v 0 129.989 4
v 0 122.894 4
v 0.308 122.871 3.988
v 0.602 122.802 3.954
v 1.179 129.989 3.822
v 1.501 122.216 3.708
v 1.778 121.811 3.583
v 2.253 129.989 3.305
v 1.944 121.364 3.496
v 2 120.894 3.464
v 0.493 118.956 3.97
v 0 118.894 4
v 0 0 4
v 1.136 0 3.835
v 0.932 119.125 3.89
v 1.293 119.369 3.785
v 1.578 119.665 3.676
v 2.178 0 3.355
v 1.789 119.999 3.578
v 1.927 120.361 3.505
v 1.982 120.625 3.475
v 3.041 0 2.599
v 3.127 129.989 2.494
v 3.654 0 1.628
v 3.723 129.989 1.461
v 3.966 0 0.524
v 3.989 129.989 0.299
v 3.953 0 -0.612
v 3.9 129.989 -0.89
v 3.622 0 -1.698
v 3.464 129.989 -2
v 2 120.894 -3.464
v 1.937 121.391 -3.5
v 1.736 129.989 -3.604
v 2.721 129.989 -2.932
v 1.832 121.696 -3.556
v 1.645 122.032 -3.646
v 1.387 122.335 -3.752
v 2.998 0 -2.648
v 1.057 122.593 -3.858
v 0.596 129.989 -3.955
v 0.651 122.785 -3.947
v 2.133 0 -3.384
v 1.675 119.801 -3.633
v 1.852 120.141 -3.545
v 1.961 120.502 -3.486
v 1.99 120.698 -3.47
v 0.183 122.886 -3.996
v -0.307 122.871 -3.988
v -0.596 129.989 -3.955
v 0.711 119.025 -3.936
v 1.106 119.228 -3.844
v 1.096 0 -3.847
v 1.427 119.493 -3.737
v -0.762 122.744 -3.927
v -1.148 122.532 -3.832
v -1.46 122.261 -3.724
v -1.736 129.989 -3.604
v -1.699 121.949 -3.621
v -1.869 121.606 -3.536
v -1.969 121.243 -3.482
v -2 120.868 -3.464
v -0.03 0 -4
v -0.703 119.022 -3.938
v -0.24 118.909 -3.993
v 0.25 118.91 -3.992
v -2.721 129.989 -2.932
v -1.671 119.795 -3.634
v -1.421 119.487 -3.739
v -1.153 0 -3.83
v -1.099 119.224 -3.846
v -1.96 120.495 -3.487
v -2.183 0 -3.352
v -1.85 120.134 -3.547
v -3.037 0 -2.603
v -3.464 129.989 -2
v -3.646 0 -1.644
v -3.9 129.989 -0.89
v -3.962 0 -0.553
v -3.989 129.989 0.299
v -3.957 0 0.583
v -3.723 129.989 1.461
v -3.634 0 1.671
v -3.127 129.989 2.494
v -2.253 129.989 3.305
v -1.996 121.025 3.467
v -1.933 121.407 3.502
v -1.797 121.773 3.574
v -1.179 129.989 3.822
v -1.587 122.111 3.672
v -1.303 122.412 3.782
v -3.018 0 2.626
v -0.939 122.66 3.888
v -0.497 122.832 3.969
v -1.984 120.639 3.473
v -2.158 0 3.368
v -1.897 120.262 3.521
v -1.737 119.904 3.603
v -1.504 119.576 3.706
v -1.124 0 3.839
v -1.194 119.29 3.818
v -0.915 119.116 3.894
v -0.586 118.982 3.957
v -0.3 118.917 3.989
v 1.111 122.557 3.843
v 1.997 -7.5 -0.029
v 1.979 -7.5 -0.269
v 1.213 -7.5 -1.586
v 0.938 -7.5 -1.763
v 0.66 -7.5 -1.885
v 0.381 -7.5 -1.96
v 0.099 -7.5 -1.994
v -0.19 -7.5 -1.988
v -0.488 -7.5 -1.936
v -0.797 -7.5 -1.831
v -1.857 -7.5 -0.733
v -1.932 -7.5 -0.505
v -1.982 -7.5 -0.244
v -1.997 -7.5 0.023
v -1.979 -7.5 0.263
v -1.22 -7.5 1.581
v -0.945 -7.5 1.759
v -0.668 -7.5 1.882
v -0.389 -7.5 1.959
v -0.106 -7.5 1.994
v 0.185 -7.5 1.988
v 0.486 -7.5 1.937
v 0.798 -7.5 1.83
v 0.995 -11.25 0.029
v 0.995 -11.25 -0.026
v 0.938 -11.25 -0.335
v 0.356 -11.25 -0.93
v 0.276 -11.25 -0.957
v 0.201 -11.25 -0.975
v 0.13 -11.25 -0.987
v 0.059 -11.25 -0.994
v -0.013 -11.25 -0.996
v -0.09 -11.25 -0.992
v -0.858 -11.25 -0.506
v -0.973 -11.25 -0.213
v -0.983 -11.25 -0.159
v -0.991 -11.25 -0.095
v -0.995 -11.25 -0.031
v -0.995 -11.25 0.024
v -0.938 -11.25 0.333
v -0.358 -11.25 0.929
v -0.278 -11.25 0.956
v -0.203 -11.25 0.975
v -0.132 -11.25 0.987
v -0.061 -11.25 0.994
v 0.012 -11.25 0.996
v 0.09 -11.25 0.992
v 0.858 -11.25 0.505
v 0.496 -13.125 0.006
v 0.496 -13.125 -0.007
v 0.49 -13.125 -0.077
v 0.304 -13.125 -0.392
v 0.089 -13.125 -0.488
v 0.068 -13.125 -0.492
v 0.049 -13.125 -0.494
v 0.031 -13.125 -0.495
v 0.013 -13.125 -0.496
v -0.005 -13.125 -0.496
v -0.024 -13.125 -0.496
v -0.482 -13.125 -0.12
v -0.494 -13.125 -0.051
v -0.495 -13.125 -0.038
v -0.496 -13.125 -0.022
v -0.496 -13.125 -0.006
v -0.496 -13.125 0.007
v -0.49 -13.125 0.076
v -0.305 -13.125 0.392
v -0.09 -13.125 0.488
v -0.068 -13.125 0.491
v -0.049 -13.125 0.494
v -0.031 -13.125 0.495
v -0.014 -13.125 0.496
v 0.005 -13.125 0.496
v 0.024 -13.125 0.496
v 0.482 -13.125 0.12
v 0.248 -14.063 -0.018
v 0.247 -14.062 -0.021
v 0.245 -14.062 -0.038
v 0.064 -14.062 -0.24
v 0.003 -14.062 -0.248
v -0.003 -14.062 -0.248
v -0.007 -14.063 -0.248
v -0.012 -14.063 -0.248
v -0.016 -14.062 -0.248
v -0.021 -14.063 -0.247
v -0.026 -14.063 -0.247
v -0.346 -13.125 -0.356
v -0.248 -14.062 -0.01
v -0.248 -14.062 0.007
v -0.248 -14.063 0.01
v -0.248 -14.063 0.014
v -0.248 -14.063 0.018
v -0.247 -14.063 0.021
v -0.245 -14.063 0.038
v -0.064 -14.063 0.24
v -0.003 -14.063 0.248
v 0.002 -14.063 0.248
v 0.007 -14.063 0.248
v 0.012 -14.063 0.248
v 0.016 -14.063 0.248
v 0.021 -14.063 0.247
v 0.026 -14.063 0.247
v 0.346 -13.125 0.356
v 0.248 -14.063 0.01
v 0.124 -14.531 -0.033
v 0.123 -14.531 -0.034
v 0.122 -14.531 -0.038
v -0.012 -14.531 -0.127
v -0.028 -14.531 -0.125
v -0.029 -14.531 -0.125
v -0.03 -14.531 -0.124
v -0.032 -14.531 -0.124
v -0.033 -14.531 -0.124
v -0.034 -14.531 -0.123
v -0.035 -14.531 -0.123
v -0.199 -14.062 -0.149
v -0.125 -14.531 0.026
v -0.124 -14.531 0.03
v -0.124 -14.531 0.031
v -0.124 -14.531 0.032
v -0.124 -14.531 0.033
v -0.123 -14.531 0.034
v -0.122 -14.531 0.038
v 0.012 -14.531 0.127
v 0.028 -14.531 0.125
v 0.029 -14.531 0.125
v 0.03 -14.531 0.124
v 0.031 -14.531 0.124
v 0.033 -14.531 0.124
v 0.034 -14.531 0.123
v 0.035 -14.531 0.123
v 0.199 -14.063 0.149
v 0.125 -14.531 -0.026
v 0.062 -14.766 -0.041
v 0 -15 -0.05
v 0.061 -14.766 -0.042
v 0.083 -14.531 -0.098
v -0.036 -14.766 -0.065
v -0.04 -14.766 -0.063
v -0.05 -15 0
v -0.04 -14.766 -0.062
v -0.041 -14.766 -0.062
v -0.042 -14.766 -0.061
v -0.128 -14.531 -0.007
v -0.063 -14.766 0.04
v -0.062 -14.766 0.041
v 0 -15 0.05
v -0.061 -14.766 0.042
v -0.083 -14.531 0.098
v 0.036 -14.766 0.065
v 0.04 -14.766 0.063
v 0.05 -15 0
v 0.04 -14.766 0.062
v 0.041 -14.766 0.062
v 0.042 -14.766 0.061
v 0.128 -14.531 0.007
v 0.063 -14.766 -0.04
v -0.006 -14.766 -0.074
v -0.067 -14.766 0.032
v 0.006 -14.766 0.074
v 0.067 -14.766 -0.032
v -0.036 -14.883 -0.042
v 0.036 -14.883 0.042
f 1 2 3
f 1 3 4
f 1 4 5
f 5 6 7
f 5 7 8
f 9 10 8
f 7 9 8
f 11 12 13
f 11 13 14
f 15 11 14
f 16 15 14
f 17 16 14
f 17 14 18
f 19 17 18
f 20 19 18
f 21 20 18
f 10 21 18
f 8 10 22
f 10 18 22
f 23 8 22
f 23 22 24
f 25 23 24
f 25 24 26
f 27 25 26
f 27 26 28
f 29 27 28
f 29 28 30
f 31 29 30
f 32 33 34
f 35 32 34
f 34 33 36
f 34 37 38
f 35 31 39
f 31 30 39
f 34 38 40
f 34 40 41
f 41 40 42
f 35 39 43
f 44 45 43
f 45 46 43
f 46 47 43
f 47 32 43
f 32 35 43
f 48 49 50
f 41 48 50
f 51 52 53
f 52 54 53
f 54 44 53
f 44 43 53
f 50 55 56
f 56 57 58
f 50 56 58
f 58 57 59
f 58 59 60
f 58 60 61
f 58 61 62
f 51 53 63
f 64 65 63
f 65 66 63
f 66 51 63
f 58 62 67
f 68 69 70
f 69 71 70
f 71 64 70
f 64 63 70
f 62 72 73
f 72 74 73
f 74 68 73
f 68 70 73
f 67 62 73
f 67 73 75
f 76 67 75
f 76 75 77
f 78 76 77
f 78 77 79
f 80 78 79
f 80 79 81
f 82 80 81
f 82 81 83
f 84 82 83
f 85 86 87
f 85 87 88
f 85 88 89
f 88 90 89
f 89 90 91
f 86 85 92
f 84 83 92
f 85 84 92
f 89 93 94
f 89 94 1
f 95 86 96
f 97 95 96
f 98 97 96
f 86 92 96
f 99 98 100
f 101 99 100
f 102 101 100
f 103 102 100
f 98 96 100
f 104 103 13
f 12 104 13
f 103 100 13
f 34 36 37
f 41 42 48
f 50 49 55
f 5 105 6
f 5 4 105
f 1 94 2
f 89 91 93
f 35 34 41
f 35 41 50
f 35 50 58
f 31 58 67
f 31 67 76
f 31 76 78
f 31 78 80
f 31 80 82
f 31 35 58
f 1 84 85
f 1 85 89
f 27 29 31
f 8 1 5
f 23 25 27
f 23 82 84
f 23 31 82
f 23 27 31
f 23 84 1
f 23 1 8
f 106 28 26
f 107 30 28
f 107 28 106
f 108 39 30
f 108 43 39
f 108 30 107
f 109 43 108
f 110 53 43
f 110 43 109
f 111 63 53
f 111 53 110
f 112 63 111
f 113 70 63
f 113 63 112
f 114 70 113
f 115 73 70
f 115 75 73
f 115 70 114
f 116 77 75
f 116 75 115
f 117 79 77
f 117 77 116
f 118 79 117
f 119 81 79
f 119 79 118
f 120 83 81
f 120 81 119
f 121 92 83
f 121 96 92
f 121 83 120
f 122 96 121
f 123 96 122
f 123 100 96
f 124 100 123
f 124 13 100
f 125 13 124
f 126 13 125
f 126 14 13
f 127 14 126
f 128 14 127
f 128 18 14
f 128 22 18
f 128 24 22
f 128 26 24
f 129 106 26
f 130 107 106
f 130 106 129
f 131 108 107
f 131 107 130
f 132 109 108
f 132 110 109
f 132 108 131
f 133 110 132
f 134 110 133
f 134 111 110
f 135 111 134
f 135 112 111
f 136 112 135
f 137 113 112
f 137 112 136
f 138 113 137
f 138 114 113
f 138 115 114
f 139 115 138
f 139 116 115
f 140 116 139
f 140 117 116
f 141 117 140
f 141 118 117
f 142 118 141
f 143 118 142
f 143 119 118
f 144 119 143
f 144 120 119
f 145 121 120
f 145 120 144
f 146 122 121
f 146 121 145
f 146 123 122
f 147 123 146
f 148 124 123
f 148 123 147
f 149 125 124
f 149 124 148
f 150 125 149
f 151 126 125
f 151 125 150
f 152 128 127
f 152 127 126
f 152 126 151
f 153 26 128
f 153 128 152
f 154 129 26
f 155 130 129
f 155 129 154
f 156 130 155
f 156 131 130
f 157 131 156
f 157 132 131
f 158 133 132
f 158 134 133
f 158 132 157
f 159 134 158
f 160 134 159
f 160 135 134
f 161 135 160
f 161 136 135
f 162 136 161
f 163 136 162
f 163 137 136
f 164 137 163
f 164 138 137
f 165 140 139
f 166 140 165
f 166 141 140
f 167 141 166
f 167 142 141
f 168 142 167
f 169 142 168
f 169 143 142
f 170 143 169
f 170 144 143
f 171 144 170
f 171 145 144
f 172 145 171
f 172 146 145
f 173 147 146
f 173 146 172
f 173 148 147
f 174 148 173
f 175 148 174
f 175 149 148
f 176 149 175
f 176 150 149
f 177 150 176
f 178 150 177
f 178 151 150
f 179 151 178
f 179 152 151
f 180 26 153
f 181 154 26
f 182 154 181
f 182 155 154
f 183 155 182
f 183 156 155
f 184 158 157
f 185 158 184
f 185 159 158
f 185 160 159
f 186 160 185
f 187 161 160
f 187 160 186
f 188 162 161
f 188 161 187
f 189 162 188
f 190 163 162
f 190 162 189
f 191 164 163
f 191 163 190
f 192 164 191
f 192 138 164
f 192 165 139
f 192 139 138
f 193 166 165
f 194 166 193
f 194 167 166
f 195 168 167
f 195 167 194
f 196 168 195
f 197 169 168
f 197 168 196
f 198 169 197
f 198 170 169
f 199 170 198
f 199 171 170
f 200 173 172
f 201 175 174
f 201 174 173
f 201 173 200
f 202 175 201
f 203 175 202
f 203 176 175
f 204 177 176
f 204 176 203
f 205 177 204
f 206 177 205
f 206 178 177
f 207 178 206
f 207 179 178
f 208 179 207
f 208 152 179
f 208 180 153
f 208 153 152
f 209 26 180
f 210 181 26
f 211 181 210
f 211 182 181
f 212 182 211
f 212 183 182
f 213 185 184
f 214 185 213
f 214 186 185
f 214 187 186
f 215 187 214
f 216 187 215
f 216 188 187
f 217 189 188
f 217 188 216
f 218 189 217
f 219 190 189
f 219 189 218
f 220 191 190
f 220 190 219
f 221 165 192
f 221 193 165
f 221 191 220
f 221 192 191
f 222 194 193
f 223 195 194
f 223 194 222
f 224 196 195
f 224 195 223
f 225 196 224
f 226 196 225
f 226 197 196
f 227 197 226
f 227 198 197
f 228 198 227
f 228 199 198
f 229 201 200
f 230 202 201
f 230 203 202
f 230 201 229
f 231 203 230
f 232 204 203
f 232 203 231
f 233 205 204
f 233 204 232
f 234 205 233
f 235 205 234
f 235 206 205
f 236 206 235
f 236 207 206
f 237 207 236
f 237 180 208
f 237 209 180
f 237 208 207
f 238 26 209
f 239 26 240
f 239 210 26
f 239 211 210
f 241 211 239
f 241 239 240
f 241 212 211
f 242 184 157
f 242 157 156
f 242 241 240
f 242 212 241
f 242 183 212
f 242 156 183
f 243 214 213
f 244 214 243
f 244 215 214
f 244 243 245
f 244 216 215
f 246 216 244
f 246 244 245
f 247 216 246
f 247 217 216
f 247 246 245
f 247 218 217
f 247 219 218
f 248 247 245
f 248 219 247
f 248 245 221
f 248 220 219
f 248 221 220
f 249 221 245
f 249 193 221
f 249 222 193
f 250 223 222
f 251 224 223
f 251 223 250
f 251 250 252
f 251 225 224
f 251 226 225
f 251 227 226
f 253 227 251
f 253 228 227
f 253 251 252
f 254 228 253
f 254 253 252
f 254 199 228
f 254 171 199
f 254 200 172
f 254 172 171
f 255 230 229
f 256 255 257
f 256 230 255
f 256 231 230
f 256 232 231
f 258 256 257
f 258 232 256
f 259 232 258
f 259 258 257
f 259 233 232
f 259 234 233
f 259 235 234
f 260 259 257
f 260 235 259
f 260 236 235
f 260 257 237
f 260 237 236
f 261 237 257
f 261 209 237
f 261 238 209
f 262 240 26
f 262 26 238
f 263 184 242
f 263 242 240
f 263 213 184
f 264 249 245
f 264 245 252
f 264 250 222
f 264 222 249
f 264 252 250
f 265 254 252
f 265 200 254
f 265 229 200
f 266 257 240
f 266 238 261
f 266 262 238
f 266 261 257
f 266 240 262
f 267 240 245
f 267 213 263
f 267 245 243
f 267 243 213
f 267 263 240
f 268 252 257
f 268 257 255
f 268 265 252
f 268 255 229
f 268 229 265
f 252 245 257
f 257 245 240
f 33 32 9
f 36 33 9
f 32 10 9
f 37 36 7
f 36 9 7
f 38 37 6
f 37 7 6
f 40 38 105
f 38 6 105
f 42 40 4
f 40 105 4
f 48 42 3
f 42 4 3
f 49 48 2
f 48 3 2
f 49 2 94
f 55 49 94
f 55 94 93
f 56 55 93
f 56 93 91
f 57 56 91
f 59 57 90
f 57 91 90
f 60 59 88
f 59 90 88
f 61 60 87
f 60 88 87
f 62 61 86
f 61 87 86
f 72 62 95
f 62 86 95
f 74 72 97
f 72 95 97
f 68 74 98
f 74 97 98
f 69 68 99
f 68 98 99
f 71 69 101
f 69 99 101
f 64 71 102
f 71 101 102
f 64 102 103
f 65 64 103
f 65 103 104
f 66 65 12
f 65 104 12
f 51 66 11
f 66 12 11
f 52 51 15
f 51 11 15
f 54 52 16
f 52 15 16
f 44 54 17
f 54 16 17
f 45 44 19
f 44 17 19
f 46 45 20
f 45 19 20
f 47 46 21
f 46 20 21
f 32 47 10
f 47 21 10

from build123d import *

# Parameters (mm, degrees)
SKETCH1_R           = 4
BOSS_EXTRUDE1_DEPTH = 129.988767867
SKETCH3_R           = 2
CUT_EXTRUDE1_DEPTH  = 19.5


with BuildPart() as part:
    # Sketch1 → Boss-Extrude1 (new body)
    with BuildSketch(Plane(origin=(0, 0, 0), x_dir=(1, 0, 0), z_dir=(0, 1, 0))):
        with Locations(Location((0, 0, 0), (0, 0, 270))):
            Circle(SKETCH1_R)
    extrude(amount=BOSS_EXTRUDE1_DEPTH)

    # Loft1: read off the stored shape, not the designer's step
    # Loft1: loft between two sections, ruled curve by curve
    loft1_from = [
        Edge.make_bspline([(0, -15, -0.05), (-0.1, -15, -0.05), (-0.1, -15, 0.05), (0, -15, 0.05), (0.1, -15, 0.05), (0.1, -15, -0.05), (0, -15, -0.05)], [0, 0, 0, 0, 0.5, 0.5, 0.5, 1, 1, 1, 1], 3, [1, 0.333333333, 0.333333333, 1, 0.333333333, 0.333333333, 1]),
    ]
    loft1_to = [
        Edge.make_bspline([(3.965560399, 0, 0.523765905), (5.013092209, 0, -7.407354893), (-2.918028589, 0, -8.454886703), (-3.965560399, 0, -0.523765905), (-5.013092209, 0, 7.407354893), (2.918028589, 0, 8.454886703), (3.965560399, 0, 0.523765905)], [0, 0, 0, 0, 0.5, 0.5, 0.5, 1, 1, 1, 1], 3, [1, 0.333333333, 0.333333333, 1, 0.333333333, 0.333333333, 1]),
    ]
    loft1 = Solid(Shell([*[Face.make_surface_from_curves(loft1_from[k], loft1_to[k]) for k in range(1)], Face(Wire(loft1_from)), Face(Wire(loft1_to))]))
    add(loft1)

    # Sketch3 → Cut-Extrude1 (cut, symmetric)
    with BuildSketch(Plane.XY):
        with Locations((0, 120.894404614)):
            Circle(SKETCH3_R)
    extrude(amount=CUT_EXTRUDE1_DEPTH, both=True, mode=Mode.SUBTRACT)


solid = part.part
